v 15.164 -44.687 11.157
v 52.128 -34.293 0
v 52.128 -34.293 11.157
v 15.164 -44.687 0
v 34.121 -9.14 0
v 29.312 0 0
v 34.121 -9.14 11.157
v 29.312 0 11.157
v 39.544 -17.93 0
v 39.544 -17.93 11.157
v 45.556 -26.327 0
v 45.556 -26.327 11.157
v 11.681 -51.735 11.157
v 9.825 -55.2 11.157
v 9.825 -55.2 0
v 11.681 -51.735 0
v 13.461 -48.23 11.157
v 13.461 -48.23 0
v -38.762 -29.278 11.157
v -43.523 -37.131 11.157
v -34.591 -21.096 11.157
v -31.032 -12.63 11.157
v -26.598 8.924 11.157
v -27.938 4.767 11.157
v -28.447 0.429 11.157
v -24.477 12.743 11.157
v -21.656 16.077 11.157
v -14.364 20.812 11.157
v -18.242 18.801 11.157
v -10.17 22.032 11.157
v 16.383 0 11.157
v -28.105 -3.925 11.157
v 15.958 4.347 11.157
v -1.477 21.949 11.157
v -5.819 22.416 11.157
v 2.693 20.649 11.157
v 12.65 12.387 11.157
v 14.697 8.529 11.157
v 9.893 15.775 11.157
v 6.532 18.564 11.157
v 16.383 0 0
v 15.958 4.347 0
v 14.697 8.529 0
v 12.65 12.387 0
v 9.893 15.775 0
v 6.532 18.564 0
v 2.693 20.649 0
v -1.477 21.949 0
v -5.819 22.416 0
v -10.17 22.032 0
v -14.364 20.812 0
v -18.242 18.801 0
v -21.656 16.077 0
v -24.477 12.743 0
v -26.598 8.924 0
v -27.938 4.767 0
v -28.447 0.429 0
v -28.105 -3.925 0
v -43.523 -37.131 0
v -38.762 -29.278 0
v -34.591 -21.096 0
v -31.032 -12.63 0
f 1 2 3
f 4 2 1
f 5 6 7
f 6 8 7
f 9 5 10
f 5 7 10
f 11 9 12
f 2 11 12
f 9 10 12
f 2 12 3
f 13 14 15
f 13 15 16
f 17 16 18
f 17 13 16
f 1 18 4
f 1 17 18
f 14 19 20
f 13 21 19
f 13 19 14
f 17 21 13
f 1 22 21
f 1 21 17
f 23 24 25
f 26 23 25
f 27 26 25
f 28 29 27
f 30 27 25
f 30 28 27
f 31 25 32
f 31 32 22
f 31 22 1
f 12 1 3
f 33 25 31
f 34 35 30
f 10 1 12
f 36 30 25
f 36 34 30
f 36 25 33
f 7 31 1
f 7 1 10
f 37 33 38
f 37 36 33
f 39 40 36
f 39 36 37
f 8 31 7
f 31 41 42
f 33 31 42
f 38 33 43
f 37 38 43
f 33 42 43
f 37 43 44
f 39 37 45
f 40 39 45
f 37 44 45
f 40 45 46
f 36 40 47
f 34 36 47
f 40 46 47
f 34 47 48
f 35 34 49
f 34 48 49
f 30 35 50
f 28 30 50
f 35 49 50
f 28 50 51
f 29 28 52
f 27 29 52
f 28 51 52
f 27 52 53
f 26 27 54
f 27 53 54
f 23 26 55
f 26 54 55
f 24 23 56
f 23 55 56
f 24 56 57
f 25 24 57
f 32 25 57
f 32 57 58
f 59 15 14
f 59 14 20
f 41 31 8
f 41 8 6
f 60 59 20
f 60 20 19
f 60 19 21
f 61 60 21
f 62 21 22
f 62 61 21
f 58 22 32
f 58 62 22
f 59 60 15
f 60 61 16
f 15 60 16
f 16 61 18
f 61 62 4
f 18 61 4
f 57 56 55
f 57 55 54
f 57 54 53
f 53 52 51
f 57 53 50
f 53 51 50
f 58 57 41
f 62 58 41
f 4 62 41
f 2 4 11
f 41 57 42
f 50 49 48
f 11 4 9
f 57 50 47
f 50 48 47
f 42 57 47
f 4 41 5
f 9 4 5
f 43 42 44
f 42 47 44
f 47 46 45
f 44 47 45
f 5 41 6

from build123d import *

# Parameters (mm, degrees)
F0_W     = 56.3245862722
F0_H     = 11.1567229033
F4_DEPTH = 11.1567229033


with BuildPart() as f2:
    # F2: sweep along a path in F1
    with BuildLine(Plane.XY) as f2_path:
        ThreePointArc((-23.6530322582, -43.8611544669), (-13.0490165439, -22.6514177551), (-6.0339360498, 0))
    # F0 (on Front) → F2 (sweep)
    with BuildSketch(Plane.XZ):
        with Locations((1.150039956, 5.5783614516)):
            Rectangle(F0_W, F0_H)
    sweep(path=f2_path.line)

    # F3: sweep along a path in F1
    with BuildLine(Plane.XY) as f3_path:
        ThreePointArc((-6.0339360498, 0), (4.5287353952, -22.758853007), (18.1018076837, -43.8611544669))
    # F0 (on Front) → F3 (sweep)
    with BuildSketch(Plane.XZ):
        with Locations((1.150039956, 5.5783614516)):
            Rectangle(F0_W, F0_H)
    sweep(path=f3_path.line)

    # F1 (on Top) → F4 (join, through all)
    with BuildSketch(Plane.XY):
        with BuildLine():
            ThreePointArc((16.3831246193, 0), (-19.3757451039, 18.0144591983), (-12.569889783, -21.4430855485))
            ThreePointArc((-12.569889783, -21.4430855485), (-8.8880028651, -10.8477045125), (-6.0339360498, 0))
            ThreePointArc((-6.0339360498, 0), (-1.7021386375, -10.3433289498), (3.2543247609, -20.402274877))
            ThreePointArc((3.2543247609, -20.402274877), (12.8173253821, -12.1307275738), (16.3831246193, 0))
        make_face()
    extrude(amount=F4_DEPTH)


solid = f2.part
